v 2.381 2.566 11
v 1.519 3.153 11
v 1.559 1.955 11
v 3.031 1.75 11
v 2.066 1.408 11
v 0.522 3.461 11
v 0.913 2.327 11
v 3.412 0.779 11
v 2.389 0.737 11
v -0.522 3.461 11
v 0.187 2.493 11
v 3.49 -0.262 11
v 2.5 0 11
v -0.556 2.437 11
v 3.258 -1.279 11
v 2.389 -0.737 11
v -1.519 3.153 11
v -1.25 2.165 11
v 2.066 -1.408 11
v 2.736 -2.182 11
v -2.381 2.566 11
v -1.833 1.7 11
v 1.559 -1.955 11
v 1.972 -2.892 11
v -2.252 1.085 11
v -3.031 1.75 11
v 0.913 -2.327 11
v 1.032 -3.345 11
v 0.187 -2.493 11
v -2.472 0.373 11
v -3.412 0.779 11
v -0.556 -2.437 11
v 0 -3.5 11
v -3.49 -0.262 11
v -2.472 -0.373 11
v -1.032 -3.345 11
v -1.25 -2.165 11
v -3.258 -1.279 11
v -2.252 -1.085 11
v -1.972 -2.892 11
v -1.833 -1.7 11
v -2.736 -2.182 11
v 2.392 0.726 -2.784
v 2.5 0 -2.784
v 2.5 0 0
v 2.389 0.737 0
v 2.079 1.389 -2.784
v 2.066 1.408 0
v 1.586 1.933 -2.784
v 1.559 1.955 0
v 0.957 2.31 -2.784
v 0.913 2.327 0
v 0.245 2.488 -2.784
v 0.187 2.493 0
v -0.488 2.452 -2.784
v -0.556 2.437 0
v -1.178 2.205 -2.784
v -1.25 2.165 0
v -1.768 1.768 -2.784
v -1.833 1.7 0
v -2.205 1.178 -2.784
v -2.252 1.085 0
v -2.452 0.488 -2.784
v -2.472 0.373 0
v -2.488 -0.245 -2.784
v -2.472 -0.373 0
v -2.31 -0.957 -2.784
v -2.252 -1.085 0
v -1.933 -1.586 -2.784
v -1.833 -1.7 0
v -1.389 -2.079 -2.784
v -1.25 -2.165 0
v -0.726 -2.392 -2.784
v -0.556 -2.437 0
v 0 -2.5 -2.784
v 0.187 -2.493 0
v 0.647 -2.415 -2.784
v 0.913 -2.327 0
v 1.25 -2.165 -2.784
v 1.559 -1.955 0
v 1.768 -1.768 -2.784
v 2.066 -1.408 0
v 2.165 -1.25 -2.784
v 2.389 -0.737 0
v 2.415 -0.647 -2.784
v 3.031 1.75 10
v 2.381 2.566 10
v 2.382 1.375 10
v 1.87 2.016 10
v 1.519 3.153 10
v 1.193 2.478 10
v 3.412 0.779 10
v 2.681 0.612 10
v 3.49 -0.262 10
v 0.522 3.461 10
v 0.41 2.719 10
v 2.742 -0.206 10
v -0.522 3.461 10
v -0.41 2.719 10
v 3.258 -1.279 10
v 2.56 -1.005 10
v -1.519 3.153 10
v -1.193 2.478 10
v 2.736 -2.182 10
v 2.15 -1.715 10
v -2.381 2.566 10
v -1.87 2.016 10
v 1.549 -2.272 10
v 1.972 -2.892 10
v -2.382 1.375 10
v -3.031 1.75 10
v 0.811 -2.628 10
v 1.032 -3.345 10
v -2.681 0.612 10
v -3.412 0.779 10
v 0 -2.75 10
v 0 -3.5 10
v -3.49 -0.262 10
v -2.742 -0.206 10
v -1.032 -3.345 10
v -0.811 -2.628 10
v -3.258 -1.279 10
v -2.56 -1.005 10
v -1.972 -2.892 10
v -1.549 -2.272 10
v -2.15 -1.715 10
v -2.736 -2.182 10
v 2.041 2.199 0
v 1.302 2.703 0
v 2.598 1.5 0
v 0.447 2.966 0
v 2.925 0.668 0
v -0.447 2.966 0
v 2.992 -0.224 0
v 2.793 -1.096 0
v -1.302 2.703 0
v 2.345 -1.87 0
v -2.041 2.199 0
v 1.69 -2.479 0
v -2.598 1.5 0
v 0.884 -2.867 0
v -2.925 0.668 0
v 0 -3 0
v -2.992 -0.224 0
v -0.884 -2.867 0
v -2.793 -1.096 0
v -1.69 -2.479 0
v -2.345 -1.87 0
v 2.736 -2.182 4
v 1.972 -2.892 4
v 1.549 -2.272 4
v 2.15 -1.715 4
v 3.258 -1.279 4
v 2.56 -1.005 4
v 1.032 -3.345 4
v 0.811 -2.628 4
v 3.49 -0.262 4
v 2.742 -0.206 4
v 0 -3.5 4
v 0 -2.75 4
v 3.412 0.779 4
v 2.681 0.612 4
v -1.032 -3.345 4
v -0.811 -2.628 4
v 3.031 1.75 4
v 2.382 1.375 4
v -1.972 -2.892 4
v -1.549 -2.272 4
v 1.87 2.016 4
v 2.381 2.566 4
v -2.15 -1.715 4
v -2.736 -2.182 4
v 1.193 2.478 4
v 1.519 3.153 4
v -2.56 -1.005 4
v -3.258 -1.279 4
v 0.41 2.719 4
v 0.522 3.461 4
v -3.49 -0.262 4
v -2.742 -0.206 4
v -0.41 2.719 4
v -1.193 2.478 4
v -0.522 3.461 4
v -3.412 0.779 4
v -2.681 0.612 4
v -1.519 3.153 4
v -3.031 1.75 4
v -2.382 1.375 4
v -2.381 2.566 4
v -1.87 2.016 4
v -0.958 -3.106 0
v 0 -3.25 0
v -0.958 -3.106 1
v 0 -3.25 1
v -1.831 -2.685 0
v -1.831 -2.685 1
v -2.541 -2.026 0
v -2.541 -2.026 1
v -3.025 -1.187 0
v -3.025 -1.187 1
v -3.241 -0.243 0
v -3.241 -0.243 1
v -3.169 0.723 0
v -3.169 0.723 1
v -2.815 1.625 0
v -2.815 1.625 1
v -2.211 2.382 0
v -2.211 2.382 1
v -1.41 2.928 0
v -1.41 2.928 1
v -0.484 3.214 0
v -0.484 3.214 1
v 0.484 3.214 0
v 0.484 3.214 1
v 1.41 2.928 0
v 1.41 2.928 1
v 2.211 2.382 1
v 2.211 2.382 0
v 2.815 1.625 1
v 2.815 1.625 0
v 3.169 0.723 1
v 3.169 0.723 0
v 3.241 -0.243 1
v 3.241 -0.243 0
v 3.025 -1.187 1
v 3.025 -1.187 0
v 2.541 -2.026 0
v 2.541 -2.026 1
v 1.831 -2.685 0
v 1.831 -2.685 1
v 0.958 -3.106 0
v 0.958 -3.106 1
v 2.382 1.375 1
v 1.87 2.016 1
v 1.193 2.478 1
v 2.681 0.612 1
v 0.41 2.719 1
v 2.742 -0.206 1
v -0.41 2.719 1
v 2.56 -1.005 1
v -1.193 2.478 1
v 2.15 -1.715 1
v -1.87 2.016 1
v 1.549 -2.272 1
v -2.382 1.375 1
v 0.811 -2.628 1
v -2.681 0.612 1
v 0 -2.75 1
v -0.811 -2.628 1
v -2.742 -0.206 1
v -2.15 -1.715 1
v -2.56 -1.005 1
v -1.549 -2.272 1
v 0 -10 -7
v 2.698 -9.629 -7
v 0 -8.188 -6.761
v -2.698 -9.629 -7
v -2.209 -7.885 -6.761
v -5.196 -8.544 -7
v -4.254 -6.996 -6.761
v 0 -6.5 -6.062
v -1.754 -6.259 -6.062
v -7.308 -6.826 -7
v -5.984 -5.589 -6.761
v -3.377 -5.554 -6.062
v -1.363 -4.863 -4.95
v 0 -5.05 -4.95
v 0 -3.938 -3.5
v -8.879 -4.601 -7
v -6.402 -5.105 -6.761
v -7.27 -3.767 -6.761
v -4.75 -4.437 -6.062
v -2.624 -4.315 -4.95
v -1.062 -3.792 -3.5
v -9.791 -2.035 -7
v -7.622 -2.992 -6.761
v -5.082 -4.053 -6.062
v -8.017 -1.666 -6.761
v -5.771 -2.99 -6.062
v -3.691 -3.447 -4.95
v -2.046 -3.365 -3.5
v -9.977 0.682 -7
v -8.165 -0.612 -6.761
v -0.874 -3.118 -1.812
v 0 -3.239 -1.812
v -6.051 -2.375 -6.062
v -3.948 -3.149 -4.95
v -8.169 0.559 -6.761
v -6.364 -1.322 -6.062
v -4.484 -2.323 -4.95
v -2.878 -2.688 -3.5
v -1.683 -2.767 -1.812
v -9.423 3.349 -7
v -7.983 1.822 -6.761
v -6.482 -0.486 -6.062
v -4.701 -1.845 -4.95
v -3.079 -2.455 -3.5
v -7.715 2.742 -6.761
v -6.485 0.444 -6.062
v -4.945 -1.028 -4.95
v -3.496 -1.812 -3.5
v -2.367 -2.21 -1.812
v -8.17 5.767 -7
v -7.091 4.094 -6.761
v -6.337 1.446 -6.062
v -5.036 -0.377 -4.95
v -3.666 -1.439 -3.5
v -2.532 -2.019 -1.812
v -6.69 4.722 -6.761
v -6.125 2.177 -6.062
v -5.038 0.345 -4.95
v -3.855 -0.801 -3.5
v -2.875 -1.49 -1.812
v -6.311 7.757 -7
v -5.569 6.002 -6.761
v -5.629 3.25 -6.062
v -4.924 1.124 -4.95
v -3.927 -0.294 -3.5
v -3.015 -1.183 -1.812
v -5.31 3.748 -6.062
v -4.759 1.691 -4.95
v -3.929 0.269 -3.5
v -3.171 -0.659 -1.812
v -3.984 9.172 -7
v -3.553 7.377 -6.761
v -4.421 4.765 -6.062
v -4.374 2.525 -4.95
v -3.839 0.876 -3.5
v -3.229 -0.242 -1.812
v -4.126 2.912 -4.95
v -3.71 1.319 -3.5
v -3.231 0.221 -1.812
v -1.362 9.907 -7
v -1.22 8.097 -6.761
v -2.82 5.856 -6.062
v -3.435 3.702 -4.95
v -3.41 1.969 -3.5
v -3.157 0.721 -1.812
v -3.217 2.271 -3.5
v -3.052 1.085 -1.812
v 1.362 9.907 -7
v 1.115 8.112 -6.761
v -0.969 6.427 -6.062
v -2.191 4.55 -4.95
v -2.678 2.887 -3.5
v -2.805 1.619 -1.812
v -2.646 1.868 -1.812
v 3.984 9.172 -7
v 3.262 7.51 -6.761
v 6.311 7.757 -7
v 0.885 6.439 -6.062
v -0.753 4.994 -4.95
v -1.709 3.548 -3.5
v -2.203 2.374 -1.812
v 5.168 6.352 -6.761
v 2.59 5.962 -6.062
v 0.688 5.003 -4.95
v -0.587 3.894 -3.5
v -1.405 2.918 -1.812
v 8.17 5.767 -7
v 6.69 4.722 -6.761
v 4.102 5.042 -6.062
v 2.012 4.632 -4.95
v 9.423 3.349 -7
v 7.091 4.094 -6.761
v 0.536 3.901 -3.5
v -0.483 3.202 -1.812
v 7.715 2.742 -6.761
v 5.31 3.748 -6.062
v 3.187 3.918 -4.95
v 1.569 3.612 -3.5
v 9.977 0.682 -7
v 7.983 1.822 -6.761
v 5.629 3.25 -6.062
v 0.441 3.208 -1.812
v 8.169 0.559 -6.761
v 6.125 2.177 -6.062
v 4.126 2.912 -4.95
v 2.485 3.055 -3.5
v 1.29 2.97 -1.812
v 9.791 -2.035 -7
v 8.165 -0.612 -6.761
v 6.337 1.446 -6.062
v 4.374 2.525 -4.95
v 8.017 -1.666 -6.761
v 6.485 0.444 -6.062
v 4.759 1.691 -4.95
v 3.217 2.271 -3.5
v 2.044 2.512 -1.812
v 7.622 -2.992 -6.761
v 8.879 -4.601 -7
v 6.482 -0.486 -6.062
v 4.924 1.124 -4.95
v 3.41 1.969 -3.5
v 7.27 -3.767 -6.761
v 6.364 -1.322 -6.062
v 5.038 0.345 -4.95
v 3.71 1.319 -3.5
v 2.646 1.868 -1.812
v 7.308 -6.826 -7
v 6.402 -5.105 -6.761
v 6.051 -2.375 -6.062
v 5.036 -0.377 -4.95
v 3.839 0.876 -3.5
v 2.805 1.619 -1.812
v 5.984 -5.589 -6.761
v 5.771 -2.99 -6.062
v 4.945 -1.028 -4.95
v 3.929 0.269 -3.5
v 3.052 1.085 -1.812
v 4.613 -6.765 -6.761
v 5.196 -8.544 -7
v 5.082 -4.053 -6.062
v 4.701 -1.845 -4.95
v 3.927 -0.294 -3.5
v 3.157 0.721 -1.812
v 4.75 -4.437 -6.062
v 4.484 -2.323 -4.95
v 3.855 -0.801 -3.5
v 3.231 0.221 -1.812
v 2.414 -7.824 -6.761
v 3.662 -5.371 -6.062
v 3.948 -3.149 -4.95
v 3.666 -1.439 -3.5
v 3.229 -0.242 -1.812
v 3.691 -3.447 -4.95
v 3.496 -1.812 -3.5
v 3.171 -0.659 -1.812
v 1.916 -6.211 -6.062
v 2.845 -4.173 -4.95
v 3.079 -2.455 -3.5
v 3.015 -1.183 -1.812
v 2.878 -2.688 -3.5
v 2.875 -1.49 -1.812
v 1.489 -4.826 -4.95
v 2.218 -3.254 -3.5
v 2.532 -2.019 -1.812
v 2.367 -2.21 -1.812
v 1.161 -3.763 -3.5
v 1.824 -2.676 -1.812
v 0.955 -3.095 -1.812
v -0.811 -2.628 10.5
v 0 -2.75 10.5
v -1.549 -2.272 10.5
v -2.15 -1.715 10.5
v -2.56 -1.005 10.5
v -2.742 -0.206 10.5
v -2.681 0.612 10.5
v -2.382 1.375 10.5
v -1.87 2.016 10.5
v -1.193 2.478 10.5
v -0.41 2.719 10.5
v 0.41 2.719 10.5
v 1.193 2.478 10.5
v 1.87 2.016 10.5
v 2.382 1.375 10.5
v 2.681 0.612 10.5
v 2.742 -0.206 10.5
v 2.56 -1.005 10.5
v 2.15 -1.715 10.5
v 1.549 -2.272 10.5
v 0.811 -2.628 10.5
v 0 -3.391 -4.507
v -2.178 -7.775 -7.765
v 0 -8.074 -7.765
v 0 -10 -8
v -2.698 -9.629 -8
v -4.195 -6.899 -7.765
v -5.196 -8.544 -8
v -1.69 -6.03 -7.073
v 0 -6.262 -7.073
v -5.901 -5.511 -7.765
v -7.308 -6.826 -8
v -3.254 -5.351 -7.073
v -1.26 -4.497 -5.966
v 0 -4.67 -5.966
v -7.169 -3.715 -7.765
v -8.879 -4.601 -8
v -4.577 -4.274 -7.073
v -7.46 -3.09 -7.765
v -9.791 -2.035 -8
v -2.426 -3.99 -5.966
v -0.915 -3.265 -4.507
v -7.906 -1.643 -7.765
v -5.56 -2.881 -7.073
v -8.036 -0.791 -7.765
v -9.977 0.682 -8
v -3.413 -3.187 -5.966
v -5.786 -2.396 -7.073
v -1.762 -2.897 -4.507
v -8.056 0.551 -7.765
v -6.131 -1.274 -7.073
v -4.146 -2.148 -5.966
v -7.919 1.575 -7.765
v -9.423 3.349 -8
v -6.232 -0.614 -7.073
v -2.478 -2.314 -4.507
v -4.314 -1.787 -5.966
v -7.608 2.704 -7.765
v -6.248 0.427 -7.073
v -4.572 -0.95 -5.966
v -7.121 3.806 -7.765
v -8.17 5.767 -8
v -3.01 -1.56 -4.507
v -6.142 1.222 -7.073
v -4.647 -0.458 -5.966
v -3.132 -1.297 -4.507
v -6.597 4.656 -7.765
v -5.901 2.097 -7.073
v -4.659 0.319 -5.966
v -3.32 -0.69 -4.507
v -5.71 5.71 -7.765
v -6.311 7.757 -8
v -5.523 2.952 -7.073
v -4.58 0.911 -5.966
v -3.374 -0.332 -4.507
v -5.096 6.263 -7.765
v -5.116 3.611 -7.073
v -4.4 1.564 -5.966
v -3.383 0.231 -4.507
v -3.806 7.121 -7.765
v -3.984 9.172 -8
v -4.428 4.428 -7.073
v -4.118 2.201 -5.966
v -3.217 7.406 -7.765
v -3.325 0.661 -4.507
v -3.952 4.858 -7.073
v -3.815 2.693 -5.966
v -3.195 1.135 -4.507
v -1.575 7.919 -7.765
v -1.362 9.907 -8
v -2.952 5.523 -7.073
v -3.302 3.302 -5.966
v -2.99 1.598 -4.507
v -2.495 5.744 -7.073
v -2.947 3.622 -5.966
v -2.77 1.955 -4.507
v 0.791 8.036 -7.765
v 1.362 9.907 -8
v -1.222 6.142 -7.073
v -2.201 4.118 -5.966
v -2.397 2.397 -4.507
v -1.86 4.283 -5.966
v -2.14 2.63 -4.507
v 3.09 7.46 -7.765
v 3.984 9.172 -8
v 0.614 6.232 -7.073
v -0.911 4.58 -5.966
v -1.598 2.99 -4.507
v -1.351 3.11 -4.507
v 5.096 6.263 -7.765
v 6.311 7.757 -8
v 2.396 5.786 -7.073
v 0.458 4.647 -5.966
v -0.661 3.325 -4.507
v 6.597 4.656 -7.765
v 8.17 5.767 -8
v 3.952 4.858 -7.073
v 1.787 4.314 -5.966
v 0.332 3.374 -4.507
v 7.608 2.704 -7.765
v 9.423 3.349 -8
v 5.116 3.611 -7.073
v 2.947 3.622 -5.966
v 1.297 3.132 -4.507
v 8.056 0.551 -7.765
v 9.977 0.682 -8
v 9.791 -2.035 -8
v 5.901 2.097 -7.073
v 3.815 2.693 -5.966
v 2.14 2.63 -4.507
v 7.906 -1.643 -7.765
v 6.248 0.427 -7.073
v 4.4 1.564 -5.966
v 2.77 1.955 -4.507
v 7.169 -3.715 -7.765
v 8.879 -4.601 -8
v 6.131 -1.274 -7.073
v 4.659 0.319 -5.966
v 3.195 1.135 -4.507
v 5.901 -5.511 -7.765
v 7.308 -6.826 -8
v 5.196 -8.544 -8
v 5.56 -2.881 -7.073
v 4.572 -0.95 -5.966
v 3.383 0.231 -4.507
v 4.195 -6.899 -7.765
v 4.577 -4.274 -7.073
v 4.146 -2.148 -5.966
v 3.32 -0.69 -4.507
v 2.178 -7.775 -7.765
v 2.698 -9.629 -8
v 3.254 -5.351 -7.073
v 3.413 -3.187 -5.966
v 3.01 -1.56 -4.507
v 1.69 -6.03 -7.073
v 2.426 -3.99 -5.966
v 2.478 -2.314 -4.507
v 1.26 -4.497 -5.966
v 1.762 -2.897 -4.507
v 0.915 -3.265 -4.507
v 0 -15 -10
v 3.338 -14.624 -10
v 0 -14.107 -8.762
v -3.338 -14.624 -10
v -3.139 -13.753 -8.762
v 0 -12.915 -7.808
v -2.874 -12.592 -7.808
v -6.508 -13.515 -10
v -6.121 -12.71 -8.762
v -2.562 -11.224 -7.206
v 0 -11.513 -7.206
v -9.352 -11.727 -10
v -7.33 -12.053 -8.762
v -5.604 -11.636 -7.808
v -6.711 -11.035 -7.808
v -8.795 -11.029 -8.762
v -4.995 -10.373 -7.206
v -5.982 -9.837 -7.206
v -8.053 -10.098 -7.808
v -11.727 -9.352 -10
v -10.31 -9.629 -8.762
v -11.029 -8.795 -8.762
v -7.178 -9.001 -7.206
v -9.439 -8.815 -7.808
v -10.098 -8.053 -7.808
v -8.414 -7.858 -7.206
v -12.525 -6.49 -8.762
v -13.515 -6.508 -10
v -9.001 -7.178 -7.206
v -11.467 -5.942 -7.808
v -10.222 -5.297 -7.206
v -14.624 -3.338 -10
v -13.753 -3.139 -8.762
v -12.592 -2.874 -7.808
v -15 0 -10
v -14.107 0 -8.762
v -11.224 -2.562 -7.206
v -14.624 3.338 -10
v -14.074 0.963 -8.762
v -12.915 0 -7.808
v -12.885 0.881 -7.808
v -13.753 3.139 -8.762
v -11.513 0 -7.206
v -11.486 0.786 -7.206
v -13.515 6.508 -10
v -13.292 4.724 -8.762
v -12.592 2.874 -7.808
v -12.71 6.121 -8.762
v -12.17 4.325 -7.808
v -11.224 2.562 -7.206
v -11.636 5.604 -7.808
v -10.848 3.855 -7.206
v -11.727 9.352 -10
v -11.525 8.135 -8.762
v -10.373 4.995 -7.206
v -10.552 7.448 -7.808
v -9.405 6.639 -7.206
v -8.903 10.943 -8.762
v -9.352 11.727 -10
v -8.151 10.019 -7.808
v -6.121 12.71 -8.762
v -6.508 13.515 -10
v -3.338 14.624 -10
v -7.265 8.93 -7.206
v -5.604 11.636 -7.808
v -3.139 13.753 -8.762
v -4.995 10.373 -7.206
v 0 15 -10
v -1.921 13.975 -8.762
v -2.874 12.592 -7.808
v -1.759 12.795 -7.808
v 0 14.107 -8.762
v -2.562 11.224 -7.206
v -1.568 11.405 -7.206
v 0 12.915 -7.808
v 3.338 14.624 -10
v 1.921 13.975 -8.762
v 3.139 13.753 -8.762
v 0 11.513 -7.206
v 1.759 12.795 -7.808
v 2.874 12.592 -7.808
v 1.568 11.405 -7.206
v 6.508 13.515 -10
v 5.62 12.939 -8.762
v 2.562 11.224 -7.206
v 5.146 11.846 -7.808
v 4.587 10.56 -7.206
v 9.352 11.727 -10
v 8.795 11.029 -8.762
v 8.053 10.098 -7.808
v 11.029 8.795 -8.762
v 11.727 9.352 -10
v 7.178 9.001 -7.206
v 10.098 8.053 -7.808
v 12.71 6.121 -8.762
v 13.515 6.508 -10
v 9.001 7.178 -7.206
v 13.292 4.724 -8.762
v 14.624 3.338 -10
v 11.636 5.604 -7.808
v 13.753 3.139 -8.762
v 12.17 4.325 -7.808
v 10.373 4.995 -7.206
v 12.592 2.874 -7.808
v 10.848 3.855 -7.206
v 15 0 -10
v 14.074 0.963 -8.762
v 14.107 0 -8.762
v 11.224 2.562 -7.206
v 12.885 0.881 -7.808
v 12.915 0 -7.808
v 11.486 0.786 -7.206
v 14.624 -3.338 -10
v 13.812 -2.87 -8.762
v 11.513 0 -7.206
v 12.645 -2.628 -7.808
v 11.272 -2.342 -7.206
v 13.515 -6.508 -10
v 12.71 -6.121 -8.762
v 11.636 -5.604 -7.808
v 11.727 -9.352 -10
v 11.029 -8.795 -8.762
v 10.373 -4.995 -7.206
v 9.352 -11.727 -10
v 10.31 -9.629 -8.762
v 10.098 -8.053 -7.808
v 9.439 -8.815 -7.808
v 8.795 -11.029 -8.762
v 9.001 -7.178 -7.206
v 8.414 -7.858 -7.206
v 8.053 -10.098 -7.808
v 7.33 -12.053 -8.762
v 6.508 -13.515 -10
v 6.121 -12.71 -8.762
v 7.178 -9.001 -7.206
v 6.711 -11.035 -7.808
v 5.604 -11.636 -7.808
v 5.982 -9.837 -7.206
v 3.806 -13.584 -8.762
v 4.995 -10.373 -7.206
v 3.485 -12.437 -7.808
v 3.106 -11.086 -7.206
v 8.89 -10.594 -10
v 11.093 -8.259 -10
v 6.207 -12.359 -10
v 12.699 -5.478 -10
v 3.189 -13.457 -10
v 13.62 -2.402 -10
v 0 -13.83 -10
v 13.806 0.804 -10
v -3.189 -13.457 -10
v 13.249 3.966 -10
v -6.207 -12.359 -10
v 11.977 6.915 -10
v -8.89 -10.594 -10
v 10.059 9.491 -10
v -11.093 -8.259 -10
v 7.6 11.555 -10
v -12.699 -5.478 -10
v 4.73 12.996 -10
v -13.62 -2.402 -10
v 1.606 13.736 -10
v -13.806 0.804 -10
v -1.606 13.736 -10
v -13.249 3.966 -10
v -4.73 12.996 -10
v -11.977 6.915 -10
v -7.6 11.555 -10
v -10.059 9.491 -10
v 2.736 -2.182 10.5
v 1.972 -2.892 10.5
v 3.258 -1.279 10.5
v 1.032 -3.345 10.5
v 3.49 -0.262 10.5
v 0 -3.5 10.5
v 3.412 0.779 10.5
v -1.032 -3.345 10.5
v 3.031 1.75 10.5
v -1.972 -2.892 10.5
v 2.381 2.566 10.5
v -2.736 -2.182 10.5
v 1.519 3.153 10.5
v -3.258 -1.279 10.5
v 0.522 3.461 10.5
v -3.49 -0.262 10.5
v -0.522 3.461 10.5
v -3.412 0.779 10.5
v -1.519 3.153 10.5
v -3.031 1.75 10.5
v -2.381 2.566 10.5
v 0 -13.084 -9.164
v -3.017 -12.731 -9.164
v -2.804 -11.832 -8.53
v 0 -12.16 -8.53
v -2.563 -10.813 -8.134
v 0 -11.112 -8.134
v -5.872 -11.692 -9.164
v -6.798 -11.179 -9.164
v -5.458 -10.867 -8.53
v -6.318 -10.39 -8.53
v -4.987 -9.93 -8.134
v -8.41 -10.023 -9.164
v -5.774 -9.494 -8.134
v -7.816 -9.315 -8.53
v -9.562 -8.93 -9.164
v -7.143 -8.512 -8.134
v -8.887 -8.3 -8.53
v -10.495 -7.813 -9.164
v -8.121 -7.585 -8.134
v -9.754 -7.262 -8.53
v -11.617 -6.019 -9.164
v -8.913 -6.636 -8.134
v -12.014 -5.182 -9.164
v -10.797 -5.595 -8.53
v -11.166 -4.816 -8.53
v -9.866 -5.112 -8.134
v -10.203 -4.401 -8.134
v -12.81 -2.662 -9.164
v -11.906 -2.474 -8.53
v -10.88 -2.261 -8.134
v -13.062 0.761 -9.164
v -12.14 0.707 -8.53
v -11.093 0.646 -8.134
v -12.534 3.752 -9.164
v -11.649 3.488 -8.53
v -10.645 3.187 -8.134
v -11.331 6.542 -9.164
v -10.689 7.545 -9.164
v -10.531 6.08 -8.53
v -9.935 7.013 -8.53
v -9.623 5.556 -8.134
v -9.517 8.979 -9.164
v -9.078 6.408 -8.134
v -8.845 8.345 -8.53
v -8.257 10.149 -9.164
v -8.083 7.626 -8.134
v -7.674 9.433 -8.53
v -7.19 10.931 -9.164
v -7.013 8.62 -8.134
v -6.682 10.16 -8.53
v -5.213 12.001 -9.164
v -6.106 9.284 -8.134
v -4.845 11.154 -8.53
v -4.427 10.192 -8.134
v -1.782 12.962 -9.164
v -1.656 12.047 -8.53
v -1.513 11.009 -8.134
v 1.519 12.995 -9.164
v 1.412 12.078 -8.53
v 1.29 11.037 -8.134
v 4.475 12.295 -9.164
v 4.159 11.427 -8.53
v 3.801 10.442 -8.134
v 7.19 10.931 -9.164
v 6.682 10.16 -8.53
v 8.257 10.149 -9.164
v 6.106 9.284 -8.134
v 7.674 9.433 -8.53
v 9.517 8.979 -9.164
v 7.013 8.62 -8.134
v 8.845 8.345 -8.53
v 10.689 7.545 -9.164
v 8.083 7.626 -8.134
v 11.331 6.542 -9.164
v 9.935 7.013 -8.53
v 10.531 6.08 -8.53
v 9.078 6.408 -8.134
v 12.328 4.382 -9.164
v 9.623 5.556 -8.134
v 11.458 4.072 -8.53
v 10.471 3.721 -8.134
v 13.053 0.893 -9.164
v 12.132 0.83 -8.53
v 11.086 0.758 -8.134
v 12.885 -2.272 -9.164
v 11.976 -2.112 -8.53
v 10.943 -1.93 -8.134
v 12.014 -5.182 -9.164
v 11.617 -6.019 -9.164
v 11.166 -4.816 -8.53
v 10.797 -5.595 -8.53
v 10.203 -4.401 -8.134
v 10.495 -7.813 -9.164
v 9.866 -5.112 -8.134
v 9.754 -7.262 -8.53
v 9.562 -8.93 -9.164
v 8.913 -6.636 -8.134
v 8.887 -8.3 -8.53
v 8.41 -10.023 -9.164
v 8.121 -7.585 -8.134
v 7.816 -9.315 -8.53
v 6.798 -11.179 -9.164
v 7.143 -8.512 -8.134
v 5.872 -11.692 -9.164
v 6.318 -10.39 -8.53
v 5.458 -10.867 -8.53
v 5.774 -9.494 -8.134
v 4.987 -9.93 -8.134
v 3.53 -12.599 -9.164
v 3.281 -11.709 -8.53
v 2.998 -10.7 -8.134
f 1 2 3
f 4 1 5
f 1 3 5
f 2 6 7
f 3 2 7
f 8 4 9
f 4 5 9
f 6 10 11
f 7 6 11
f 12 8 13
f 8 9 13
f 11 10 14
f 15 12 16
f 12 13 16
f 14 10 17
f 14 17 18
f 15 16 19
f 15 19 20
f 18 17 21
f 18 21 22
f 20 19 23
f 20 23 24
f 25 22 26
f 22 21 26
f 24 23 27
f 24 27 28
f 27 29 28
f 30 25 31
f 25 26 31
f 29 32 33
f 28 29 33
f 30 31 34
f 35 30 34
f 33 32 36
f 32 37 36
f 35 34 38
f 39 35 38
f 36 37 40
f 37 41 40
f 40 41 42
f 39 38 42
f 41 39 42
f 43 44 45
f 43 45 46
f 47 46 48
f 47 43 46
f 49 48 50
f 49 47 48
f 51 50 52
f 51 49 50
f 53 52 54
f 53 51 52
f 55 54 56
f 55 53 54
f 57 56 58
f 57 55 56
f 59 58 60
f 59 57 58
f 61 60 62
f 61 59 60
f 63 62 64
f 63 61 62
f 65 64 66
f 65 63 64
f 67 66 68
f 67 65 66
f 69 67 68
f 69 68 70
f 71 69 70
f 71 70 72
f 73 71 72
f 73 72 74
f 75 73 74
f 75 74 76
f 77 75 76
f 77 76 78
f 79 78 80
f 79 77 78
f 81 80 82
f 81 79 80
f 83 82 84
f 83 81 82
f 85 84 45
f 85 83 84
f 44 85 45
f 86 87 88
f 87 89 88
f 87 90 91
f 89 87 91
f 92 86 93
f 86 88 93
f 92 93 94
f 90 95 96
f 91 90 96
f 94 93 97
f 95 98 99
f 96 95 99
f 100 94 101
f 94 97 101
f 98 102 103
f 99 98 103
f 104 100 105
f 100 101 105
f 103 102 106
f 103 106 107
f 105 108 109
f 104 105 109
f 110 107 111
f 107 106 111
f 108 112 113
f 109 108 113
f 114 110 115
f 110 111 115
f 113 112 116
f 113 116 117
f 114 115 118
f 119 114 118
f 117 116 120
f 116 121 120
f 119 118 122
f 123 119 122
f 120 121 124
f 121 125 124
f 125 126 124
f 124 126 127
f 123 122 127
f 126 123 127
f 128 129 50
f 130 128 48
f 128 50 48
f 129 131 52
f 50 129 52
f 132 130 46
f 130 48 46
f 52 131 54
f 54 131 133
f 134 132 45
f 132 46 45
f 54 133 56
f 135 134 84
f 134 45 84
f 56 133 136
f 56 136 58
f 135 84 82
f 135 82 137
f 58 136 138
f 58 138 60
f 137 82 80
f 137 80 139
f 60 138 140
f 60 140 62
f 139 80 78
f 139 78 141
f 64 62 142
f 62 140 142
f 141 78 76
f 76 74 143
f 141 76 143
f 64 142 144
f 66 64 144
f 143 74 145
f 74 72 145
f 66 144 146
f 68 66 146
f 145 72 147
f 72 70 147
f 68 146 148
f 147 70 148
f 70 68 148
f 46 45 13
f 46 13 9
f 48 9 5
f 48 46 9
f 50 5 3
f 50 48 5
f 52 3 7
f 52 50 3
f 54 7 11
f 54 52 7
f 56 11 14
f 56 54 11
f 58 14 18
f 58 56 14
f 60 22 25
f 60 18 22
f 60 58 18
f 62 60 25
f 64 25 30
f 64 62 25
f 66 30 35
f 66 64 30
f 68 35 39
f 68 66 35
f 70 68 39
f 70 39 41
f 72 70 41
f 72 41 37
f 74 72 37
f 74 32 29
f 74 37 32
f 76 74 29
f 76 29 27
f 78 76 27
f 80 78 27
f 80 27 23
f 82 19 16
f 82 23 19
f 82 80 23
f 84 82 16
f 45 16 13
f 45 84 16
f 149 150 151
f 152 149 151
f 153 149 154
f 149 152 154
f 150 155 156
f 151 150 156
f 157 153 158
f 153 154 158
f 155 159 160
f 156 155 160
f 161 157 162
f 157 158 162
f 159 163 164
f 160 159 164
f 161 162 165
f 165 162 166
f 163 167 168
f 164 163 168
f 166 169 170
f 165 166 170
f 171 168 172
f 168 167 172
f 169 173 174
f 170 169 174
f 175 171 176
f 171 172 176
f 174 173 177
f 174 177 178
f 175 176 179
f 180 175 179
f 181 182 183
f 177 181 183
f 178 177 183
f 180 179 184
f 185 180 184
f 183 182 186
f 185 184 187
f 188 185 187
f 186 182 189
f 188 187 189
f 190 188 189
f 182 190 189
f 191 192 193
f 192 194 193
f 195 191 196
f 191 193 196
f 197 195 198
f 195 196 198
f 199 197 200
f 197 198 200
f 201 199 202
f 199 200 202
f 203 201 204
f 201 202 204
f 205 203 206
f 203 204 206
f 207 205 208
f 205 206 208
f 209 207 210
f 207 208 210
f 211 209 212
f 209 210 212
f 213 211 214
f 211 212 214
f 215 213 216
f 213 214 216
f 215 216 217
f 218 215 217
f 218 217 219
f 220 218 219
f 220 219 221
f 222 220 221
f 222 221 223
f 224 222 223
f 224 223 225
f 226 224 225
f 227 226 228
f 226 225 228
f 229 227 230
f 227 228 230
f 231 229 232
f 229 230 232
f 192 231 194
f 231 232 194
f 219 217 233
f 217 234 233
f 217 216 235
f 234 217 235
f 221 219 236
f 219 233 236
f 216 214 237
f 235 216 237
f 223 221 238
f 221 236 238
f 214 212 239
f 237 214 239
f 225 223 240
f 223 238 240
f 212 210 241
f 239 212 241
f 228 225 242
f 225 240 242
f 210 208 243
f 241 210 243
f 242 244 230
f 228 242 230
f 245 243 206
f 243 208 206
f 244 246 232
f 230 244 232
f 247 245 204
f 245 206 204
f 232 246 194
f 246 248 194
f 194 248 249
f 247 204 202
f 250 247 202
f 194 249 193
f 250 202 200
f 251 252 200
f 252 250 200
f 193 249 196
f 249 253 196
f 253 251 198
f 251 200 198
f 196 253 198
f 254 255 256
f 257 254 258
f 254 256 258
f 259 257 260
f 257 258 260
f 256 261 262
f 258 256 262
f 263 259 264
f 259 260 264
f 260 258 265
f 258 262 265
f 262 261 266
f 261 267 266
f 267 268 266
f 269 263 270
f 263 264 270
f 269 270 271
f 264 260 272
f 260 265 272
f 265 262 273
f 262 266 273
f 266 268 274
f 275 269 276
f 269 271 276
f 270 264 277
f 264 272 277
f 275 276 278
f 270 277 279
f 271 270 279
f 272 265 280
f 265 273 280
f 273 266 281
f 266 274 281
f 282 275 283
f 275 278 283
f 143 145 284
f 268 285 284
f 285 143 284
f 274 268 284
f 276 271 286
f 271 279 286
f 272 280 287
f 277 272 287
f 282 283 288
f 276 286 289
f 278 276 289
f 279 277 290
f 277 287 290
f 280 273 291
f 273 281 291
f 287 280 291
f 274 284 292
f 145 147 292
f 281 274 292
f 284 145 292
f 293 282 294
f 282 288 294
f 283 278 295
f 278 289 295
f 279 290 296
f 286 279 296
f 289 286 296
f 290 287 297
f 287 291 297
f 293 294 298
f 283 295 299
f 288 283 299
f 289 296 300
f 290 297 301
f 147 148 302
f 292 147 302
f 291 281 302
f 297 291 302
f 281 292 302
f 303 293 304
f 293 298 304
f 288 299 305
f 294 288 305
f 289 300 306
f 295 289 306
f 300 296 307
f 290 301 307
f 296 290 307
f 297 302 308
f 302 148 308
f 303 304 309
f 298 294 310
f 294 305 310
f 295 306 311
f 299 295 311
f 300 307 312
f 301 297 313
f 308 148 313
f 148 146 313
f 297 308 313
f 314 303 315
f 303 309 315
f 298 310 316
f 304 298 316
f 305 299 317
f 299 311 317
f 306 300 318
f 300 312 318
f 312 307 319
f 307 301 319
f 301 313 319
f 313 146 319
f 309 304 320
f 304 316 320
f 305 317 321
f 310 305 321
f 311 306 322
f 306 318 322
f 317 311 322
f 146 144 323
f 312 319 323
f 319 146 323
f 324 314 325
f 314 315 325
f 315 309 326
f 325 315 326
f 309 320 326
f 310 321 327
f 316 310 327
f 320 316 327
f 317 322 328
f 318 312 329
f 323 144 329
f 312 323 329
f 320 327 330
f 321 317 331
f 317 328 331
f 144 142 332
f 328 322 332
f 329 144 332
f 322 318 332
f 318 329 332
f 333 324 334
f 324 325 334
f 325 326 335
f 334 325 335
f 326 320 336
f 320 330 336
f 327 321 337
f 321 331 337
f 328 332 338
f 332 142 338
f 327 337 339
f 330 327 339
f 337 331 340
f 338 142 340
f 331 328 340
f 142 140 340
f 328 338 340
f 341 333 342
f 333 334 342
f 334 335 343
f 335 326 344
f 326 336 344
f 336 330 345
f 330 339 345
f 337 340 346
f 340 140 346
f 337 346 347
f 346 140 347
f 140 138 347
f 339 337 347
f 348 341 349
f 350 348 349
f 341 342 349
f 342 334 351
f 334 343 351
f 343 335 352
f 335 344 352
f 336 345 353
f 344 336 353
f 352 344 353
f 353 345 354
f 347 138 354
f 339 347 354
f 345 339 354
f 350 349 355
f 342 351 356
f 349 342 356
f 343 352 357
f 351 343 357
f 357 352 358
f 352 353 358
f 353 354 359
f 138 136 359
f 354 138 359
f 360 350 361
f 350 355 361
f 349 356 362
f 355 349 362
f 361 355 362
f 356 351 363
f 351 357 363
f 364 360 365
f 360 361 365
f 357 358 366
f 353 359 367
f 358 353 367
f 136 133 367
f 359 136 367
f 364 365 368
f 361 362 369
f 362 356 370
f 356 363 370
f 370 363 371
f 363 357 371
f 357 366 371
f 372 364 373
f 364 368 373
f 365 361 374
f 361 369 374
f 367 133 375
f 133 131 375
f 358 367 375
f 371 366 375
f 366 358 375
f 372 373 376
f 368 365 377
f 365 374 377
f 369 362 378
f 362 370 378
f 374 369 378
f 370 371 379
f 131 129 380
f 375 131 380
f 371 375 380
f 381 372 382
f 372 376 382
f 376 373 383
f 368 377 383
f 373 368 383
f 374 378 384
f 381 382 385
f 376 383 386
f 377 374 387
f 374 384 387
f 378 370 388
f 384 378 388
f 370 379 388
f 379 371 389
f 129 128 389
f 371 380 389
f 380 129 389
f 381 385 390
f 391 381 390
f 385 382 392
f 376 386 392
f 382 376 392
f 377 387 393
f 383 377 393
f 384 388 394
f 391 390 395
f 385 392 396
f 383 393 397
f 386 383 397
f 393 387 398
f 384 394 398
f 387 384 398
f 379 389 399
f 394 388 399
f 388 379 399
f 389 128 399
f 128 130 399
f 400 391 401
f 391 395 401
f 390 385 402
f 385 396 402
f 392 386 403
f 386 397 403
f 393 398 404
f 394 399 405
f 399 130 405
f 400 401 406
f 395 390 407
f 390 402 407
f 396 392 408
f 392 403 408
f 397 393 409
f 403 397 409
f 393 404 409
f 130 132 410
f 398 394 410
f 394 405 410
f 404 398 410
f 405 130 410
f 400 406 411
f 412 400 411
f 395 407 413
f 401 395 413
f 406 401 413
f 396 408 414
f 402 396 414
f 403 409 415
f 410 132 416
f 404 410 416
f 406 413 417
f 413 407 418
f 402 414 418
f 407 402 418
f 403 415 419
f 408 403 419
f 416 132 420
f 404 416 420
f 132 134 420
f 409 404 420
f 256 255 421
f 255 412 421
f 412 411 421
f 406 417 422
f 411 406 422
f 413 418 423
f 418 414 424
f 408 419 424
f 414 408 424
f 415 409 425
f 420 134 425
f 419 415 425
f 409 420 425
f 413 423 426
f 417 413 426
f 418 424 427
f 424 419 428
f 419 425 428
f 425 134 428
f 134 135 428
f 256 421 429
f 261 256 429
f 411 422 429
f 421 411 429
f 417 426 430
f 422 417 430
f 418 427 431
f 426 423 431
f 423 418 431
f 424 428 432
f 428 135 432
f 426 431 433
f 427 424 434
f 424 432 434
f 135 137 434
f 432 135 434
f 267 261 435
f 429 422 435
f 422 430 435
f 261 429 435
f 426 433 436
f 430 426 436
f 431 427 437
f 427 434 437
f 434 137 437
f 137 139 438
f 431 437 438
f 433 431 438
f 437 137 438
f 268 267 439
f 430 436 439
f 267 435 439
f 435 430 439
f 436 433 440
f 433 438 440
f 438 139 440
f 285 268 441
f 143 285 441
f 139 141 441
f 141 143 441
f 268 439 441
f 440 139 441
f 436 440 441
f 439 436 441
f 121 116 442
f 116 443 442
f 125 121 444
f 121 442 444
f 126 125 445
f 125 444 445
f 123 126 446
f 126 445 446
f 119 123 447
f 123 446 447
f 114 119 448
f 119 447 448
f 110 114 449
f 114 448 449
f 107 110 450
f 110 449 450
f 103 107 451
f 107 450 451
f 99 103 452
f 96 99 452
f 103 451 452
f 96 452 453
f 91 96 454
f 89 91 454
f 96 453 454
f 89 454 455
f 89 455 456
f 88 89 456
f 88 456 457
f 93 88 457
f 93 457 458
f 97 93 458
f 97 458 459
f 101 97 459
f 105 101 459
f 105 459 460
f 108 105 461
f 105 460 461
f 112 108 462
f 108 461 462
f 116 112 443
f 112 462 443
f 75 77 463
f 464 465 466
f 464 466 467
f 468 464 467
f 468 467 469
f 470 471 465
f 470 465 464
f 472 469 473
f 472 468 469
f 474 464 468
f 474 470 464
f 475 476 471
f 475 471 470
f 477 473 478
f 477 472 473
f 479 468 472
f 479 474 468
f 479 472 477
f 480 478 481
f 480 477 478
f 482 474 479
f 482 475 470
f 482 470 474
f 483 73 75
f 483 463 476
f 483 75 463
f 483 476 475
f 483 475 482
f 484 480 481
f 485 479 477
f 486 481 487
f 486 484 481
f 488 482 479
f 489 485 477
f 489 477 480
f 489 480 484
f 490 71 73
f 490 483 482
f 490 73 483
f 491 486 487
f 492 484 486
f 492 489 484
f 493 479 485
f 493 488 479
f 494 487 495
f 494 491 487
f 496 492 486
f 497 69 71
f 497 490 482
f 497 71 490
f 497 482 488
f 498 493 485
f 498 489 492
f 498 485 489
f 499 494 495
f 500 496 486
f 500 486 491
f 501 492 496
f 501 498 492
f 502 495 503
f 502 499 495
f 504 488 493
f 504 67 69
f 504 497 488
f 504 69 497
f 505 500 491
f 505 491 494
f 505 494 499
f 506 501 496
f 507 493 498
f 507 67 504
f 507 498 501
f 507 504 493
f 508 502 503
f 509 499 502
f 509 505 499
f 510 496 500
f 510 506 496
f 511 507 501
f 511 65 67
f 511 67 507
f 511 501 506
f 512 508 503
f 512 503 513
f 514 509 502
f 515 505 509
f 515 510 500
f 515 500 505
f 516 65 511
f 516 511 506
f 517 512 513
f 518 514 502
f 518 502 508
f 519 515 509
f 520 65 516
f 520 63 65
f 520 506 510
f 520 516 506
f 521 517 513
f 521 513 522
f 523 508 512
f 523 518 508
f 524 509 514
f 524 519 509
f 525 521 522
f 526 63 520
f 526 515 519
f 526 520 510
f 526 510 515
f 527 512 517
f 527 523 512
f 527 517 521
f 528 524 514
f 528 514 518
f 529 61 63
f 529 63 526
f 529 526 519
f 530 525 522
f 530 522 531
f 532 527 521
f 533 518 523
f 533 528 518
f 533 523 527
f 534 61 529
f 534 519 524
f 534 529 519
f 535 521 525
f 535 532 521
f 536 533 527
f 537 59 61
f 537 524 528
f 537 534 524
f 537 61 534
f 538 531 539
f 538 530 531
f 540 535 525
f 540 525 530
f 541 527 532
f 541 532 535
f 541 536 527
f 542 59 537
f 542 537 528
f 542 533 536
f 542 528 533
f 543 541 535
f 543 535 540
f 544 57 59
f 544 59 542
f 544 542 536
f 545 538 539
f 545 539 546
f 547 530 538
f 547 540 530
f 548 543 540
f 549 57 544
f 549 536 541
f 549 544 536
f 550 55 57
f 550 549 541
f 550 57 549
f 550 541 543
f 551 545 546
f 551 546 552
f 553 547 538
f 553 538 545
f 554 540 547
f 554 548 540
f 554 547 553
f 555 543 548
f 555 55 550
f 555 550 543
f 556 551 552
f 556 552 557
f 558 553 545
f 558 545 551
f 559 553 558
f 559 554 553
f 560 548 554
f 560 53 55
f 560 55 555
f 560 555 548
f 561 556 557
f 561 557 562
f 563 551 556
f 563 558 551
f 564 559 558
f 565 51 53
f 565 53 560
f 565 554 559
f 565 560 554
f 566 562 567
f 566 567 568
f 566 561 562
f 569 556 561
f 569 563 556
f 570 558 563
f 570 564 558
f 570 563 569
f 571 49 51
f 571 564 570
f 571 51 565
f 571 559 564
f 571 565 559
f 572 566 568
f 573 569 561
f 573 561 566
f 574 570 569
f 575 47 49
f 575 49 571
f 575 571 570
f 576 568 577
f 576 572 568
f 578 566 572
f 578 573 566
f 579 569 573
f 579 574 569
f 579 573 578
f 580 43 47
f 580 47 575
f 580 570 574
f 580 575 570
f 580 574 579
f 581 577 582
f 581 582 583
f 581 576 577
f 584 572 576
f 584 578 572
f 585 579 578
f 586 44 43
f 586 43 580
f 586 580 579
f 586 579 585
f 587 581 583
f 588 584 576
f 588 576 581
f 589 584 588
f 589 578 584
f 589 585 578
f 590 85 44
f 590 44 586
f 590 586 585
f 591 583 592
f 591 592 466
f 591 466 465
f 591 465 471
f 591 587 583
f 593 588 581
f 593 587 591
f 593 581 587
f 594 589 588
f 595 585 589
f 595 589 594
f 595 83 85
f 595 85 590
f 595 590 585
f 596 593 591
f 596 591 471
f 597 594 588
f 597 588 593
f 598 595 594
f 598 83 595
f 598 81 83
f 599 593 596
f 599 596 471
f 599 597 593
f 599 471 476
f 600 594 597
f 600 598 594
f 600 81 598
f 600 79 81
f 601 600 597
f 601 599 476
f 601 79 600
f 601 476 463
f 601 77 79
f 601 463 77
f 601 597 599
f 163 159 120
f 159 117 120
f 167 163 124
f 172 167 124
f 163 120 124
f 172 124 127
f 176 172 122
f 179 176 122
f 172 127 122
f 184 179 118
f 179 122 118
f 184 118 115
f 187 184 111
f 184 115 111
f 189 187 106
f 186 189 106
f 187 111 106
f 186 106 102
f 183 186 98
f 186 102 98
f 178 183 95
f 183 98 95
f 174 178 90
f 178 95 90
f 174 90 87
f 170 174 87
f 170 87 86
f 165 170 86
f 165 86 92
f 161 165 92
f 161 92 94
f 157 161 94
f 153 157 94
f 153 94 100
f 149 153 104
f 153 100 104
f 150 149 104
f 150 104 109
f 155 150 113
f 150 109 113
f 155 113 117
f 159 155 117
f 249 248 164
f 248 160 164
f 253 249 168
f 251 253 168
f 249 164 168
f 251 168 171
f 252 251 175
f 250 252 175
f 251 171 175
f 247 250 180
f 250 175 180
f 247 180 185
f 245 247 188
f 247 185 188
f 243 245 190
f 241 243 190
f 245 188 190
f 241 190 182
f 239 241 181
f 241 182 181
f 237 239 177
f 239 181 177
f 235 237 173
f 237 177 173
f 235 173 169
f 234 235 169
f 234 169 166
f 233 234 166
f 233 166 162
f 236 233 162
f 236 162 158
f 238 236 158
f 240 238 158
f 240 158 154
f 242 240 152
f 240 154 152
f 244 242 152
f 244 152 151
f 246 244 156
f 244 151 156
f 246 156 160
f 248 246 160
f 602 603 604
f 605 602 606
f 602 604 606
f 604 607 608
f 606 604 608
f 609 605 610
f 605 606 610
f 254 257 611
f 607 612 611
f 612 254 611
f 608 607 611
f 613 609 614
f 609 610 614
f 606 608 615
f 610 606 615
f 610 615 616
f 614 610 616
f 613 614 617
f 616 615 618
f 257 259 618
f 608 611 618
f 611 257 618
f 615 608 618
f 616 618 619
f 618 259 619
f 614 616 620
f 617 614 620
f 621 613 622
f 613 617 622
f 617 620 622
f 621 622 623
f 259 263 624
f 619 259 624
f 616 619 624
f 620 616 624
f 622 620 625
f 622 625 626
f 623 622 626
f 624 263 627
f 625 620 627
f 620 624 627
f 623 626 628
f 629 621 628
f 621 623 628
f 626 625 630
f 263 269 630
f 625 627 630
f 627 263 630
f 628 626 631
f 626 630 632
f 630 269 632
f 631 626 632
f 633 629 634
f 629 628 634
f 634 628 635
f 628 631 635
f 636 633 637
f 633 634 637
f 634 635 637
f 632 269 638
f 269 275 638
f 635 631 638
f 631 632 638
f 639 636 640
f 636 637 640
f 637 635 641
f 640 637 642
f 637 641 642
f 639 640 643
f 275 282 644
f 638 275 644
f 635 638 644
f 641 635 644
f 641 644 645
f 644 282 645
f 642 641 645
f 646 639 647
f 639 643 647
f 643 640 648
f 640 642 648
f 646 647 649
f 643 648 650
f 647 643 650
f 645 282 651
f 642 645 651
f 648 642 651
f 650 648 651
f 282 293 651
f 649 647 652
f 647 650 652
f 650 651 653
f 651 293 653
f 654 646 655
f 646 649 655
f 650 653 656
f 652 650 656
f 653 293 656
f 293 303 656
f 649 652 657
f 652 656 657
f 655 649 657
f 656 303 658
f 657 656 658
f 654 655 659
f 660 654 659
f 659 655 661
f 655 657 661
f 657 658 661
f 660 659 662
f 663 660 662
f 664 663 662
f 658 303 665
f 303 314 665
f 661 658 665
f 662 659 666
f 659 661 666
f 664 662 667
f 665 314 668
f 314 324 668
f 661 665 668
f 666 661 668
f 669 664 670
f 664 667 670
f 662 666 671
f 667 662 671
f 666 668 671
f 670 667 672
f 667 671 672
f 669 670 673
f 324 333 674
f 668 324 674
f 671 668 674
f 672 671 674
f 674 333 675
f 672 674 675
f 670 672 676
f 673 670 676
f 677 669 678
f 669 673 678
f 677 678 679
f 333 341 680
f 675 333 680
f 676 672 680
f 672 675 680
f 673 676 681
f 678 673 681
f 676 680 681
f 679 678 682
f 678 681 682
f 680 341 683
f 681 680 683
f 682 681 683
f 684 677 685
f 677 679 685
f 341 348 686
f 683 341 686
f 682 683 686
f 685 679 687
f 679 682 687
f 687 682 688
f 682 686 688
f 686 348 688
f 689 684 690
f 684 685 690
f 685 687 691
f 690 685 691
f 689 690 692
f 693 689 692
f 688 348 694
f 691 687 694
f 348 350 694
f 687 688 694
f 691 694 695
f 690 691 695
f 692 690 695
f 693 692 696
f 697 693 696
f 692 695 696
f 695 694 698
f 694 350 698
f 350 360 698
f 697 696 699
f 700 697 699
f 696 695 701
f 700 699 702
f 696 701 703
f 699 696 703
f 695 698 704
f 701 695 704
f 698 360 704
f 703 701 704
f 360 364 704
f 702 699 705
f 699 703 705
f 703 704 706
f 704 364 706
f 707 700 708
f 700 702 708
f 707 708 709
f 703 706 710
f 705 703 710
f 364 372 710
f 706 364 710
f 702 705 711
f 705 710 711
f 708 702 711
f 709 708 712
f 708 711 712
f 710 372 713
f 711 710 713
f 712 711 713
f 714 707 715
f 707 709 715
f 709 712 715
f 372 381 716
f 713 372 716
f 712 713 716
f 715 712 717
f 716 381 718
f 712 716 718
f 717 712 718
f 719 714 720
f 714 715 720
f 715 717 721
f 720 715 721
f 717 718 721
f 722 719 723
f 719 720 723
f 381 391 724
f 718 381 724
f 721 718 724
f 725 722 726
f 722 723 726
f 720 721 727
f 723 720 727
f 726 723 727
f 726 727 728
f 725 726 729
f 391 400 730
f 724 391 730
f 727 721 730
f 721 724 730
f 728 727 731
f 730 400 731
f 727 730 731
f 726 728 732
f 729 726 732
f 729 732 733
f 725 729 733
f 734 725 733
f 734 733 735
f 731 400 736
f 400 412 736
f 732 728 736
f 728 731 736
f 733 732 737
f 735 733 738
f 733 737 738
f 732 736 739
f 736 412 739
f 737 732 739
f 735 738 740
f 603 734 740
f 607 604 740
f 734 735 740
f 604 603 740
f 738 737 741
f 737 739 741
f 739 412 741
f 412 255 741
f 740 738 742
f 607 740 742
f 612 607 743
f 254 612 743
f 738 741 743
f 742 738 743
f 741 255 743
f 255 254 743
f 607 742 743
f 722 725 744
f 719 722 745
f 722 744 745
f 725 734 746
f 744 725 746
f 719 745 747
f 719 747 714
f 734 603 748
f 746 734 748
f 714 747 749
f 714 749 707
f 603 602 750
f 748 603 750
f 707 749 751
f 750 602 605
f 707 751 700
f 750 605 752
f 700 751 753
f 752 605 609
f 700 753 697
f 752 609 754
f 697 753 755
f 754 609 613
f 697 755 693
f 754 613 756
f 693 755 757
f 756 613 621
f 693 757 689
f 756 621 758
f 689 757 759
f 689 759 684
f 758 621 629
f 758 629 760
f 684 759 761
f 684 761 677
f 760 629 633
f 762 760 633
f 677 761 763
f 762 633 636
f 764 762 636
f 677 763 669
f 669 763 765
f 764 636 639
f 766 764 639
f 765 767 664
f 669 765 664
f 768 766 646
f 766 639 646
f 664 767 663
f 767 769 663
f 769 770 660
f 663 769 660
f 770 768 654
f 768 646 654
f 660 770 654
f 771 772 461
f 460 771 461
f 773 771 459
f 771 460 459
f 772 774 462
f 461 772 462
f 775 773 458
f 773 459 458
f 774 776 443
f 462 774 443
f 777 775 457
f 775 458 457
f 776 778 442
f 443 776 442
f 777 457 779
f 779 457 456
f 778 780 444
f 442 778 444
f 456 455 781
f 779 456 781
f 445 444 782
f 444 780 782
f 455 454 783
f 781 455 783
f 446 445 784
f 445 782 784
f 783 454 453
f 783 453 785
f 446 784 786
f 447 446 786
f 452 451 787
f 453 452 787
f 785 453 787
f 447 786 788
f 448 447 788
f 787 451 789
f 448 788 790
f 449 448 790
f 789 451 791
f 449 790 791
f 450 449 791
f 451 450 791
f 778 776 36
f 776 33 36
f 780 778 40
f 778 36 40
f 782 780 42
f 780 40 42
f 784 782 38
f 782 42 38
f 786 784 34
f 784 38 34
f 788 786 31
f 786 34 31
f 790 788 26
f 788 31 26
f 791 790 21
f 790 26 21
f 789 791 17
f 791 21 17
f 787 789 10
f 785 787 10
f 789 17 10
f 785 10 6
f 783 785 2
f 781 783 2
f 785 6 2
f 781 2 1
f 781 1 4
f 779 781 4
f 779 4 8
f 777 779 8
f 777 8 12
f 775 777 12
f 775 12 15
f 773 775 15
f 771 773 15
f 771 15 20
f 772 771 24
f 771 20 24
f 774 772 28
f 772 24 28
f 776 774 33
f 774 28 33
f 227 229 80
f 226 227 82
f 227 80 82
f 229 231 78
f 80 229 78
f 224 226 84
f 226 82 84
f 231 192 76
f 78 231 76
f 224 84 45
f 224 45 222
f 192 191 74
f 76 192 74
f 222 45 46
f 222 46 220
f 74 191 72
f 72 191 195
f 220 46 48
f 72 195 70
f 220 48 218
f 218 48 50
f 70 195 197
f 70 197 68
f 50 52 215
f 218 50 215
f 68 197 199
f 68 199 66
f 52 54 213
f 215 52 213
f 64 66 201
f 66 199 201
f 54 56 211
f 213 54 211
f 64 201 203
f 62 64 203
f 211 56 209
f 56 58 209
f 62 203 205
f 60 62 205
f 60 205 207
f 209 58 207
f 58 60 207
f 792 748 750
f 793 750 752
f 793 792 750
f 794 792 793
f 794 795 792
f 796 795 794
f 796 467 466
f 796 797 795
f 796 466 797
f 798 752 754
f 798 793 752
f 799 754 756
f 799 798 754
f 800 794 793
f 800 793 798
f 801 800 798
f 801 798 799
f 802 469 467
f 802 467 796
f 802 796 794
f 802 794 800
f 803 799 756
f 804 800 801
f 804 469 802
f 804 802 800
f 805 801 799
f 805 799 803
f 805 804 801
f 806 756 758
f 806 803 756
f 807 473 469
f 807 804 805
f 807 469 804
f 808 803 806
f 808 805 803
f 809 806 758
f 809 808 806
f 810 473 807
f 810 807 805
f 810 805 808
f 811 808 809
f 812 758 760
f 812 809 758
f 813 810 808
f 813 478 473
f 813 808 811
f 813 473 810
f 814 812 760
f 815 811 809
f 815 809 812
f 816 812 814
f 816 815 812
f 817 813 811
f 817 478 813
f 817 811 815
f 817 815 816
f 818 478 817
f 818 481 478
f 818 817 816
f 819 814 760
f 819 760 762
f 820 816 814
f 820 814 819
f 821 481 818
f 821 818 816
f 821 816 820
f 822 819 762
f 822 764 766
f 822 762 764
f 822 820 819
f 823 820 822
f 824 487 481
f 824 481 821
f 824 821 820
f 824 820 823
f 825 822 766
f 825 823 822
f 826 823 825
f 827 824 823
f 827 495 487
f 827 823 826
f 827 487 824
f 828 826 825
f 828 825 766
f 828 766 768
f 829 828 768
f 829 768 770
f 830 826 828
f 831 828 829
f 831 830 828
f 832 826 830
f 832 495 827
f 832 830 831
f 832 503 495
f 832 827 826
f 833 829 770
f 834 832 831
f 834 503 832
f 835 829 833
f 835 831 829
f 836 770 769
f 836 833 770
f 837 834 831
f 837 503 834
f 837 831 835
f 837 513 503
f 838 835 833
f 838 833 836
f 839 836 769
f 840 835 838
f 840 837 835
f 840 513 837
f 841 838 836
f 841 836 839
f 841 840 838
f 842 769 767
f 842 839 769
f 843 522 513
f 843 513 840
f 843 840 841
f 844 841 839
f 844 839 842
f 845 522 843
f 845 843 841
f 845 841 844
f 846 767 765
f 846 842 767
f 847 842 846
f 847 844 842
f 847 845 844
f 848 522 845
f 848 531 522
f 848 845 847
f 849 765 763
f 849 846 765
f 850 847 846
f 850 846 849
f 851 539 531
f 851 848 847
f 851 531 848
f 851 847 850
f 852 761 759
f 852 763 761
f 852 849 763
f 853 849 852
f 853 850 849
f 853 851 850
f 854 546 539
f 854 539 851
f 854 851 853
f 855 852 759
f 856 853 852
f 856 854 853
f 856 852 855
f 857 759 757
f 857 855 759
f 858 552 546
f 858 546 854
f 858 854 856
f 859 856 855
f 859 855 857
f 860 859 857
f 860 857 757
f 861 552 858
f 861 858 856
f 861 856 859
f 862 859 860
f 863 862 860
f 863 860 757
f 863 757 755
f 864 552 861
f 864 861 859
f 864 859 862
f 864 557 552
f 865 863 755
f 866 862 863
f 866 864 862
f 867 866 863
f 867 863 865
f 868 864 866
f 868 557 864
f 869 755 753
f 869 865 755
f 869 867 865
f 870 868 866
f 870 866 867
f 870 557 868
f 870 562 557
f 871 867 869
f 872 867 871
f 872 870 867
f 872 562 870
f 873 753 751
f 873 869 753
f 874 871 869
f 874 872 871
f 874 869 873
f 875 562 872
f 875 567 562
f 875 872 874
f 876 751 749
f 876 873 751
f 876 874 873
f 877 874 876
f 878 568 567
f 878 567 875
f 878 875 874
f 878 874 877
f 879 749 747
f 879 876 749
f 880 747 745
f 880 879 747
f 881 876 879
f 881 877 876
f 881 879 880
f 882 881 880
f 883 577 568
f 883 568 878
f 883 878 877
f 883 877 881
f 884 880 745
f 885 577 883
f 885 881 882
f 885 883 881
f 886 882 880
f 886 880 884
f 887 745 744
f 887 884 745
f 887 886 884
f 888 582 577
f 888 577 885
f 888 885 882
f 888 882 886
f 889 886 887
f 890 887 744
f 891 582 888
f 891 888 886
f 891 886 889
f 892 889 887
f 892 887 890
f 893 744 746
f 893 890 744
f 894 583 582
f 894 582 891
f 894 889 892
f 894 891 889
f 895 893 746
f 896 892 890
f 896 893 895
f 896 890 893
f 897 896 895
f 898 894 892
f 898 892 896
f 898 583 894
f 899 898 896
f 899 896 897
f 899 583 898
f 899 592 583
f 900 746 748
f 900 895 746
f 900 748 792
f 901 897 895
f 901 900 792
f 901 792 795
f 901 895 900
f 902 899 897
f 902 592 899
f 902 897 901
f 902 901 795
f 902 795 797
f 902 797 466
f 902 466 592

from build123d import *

# Parameters (mm, degrees)
SHELL1_T                = -1
CUT_EXTRUDE1_DEPTH      = 24.895606291
CUT_EXTRUDE1_DEPTH_BACK = 24.895606291
SKETCH3_R               = 2.5


with BuildPart() as part:
    # Sketch1 → Revolve1 (revolve)
    with BuildSketch(Plane.YZ):
        with BuildLine():
            Line((0, -10), (-15, -10))
            ThreePointArc((-15, -10), (-12.915475947, -7.807540088), (-10, -7))
            ThreePointArc((-10, -7), (-5.050252532, -4.949747468), (-3, 0))
            Line((-3, 0), (0, 0))
            Line((0, 0), (0, -10))
        make_face()
    revolve(axis=Axis((0, 0, 0), (0, 0, -1)))

    # Shell1
    shell1_openings = [part.faces().sort_by_distance(p)[0] for p in [
        (0, 0, -10),
    ]]
    offset(amount=SHELL1_T, openings=shell1_openings, kind=Kind.INTERSECTION)


with BuildPart() as body_2:
    # Sketch2 → Revolve2 (revolve)
    with BuildSketch(Plane.YZ):
        Polygon((0, 0), (-3.25, 0), (-3.25, 1), (-2.75, 1), (-2.75, 4), (-3.5, 4), (-3.5, 10), (-2.75, 10), (-2.75, 10.5), (-3.5, 10.5), (-3.5, 11), (0, 11), align=None)
    revolve(axis=Axis((0, 0, 11), (0, 0, -1)))


with BuildPart() as cut_extrude1_tool:
    # Sketch3 → Cut-Extrude1 (new, two sides: drawn at the far end of the back side and taken through both)
    with BuildSketch(Plane(origin=(0, 0, 0), x_dir=(0, 1, 0), z_dir=(0, 0, 1)).offset(-CUT_EXTRUDE1_DEPTH_BACK)):
        with Locations(Location((0, 0, 0), (0, 0, 270))):
            Circle(SKETCH3_R)
    extrude(amount=CUT_EXTRUDE1_DEPTH + CUT_EXTRUDE1_DEPTH_BACK)


with BuildPart() as part_1:
    add(part.part)

    # Cut-Extrude1: cut by cut_extrude1_tool
    add(cut_extrude1_tool.part, mode=Mode.SUBTRACT)


with BuildPart() as body_2_1:
    add(body_2.part)

    # Cut-Extrude1: cut by cut_extrude1_tool
    add(cut_extrude1_tool.part, mode=Mode.SUBTRACT)


solid = Compound([part_1.part, body_2_1.part])
